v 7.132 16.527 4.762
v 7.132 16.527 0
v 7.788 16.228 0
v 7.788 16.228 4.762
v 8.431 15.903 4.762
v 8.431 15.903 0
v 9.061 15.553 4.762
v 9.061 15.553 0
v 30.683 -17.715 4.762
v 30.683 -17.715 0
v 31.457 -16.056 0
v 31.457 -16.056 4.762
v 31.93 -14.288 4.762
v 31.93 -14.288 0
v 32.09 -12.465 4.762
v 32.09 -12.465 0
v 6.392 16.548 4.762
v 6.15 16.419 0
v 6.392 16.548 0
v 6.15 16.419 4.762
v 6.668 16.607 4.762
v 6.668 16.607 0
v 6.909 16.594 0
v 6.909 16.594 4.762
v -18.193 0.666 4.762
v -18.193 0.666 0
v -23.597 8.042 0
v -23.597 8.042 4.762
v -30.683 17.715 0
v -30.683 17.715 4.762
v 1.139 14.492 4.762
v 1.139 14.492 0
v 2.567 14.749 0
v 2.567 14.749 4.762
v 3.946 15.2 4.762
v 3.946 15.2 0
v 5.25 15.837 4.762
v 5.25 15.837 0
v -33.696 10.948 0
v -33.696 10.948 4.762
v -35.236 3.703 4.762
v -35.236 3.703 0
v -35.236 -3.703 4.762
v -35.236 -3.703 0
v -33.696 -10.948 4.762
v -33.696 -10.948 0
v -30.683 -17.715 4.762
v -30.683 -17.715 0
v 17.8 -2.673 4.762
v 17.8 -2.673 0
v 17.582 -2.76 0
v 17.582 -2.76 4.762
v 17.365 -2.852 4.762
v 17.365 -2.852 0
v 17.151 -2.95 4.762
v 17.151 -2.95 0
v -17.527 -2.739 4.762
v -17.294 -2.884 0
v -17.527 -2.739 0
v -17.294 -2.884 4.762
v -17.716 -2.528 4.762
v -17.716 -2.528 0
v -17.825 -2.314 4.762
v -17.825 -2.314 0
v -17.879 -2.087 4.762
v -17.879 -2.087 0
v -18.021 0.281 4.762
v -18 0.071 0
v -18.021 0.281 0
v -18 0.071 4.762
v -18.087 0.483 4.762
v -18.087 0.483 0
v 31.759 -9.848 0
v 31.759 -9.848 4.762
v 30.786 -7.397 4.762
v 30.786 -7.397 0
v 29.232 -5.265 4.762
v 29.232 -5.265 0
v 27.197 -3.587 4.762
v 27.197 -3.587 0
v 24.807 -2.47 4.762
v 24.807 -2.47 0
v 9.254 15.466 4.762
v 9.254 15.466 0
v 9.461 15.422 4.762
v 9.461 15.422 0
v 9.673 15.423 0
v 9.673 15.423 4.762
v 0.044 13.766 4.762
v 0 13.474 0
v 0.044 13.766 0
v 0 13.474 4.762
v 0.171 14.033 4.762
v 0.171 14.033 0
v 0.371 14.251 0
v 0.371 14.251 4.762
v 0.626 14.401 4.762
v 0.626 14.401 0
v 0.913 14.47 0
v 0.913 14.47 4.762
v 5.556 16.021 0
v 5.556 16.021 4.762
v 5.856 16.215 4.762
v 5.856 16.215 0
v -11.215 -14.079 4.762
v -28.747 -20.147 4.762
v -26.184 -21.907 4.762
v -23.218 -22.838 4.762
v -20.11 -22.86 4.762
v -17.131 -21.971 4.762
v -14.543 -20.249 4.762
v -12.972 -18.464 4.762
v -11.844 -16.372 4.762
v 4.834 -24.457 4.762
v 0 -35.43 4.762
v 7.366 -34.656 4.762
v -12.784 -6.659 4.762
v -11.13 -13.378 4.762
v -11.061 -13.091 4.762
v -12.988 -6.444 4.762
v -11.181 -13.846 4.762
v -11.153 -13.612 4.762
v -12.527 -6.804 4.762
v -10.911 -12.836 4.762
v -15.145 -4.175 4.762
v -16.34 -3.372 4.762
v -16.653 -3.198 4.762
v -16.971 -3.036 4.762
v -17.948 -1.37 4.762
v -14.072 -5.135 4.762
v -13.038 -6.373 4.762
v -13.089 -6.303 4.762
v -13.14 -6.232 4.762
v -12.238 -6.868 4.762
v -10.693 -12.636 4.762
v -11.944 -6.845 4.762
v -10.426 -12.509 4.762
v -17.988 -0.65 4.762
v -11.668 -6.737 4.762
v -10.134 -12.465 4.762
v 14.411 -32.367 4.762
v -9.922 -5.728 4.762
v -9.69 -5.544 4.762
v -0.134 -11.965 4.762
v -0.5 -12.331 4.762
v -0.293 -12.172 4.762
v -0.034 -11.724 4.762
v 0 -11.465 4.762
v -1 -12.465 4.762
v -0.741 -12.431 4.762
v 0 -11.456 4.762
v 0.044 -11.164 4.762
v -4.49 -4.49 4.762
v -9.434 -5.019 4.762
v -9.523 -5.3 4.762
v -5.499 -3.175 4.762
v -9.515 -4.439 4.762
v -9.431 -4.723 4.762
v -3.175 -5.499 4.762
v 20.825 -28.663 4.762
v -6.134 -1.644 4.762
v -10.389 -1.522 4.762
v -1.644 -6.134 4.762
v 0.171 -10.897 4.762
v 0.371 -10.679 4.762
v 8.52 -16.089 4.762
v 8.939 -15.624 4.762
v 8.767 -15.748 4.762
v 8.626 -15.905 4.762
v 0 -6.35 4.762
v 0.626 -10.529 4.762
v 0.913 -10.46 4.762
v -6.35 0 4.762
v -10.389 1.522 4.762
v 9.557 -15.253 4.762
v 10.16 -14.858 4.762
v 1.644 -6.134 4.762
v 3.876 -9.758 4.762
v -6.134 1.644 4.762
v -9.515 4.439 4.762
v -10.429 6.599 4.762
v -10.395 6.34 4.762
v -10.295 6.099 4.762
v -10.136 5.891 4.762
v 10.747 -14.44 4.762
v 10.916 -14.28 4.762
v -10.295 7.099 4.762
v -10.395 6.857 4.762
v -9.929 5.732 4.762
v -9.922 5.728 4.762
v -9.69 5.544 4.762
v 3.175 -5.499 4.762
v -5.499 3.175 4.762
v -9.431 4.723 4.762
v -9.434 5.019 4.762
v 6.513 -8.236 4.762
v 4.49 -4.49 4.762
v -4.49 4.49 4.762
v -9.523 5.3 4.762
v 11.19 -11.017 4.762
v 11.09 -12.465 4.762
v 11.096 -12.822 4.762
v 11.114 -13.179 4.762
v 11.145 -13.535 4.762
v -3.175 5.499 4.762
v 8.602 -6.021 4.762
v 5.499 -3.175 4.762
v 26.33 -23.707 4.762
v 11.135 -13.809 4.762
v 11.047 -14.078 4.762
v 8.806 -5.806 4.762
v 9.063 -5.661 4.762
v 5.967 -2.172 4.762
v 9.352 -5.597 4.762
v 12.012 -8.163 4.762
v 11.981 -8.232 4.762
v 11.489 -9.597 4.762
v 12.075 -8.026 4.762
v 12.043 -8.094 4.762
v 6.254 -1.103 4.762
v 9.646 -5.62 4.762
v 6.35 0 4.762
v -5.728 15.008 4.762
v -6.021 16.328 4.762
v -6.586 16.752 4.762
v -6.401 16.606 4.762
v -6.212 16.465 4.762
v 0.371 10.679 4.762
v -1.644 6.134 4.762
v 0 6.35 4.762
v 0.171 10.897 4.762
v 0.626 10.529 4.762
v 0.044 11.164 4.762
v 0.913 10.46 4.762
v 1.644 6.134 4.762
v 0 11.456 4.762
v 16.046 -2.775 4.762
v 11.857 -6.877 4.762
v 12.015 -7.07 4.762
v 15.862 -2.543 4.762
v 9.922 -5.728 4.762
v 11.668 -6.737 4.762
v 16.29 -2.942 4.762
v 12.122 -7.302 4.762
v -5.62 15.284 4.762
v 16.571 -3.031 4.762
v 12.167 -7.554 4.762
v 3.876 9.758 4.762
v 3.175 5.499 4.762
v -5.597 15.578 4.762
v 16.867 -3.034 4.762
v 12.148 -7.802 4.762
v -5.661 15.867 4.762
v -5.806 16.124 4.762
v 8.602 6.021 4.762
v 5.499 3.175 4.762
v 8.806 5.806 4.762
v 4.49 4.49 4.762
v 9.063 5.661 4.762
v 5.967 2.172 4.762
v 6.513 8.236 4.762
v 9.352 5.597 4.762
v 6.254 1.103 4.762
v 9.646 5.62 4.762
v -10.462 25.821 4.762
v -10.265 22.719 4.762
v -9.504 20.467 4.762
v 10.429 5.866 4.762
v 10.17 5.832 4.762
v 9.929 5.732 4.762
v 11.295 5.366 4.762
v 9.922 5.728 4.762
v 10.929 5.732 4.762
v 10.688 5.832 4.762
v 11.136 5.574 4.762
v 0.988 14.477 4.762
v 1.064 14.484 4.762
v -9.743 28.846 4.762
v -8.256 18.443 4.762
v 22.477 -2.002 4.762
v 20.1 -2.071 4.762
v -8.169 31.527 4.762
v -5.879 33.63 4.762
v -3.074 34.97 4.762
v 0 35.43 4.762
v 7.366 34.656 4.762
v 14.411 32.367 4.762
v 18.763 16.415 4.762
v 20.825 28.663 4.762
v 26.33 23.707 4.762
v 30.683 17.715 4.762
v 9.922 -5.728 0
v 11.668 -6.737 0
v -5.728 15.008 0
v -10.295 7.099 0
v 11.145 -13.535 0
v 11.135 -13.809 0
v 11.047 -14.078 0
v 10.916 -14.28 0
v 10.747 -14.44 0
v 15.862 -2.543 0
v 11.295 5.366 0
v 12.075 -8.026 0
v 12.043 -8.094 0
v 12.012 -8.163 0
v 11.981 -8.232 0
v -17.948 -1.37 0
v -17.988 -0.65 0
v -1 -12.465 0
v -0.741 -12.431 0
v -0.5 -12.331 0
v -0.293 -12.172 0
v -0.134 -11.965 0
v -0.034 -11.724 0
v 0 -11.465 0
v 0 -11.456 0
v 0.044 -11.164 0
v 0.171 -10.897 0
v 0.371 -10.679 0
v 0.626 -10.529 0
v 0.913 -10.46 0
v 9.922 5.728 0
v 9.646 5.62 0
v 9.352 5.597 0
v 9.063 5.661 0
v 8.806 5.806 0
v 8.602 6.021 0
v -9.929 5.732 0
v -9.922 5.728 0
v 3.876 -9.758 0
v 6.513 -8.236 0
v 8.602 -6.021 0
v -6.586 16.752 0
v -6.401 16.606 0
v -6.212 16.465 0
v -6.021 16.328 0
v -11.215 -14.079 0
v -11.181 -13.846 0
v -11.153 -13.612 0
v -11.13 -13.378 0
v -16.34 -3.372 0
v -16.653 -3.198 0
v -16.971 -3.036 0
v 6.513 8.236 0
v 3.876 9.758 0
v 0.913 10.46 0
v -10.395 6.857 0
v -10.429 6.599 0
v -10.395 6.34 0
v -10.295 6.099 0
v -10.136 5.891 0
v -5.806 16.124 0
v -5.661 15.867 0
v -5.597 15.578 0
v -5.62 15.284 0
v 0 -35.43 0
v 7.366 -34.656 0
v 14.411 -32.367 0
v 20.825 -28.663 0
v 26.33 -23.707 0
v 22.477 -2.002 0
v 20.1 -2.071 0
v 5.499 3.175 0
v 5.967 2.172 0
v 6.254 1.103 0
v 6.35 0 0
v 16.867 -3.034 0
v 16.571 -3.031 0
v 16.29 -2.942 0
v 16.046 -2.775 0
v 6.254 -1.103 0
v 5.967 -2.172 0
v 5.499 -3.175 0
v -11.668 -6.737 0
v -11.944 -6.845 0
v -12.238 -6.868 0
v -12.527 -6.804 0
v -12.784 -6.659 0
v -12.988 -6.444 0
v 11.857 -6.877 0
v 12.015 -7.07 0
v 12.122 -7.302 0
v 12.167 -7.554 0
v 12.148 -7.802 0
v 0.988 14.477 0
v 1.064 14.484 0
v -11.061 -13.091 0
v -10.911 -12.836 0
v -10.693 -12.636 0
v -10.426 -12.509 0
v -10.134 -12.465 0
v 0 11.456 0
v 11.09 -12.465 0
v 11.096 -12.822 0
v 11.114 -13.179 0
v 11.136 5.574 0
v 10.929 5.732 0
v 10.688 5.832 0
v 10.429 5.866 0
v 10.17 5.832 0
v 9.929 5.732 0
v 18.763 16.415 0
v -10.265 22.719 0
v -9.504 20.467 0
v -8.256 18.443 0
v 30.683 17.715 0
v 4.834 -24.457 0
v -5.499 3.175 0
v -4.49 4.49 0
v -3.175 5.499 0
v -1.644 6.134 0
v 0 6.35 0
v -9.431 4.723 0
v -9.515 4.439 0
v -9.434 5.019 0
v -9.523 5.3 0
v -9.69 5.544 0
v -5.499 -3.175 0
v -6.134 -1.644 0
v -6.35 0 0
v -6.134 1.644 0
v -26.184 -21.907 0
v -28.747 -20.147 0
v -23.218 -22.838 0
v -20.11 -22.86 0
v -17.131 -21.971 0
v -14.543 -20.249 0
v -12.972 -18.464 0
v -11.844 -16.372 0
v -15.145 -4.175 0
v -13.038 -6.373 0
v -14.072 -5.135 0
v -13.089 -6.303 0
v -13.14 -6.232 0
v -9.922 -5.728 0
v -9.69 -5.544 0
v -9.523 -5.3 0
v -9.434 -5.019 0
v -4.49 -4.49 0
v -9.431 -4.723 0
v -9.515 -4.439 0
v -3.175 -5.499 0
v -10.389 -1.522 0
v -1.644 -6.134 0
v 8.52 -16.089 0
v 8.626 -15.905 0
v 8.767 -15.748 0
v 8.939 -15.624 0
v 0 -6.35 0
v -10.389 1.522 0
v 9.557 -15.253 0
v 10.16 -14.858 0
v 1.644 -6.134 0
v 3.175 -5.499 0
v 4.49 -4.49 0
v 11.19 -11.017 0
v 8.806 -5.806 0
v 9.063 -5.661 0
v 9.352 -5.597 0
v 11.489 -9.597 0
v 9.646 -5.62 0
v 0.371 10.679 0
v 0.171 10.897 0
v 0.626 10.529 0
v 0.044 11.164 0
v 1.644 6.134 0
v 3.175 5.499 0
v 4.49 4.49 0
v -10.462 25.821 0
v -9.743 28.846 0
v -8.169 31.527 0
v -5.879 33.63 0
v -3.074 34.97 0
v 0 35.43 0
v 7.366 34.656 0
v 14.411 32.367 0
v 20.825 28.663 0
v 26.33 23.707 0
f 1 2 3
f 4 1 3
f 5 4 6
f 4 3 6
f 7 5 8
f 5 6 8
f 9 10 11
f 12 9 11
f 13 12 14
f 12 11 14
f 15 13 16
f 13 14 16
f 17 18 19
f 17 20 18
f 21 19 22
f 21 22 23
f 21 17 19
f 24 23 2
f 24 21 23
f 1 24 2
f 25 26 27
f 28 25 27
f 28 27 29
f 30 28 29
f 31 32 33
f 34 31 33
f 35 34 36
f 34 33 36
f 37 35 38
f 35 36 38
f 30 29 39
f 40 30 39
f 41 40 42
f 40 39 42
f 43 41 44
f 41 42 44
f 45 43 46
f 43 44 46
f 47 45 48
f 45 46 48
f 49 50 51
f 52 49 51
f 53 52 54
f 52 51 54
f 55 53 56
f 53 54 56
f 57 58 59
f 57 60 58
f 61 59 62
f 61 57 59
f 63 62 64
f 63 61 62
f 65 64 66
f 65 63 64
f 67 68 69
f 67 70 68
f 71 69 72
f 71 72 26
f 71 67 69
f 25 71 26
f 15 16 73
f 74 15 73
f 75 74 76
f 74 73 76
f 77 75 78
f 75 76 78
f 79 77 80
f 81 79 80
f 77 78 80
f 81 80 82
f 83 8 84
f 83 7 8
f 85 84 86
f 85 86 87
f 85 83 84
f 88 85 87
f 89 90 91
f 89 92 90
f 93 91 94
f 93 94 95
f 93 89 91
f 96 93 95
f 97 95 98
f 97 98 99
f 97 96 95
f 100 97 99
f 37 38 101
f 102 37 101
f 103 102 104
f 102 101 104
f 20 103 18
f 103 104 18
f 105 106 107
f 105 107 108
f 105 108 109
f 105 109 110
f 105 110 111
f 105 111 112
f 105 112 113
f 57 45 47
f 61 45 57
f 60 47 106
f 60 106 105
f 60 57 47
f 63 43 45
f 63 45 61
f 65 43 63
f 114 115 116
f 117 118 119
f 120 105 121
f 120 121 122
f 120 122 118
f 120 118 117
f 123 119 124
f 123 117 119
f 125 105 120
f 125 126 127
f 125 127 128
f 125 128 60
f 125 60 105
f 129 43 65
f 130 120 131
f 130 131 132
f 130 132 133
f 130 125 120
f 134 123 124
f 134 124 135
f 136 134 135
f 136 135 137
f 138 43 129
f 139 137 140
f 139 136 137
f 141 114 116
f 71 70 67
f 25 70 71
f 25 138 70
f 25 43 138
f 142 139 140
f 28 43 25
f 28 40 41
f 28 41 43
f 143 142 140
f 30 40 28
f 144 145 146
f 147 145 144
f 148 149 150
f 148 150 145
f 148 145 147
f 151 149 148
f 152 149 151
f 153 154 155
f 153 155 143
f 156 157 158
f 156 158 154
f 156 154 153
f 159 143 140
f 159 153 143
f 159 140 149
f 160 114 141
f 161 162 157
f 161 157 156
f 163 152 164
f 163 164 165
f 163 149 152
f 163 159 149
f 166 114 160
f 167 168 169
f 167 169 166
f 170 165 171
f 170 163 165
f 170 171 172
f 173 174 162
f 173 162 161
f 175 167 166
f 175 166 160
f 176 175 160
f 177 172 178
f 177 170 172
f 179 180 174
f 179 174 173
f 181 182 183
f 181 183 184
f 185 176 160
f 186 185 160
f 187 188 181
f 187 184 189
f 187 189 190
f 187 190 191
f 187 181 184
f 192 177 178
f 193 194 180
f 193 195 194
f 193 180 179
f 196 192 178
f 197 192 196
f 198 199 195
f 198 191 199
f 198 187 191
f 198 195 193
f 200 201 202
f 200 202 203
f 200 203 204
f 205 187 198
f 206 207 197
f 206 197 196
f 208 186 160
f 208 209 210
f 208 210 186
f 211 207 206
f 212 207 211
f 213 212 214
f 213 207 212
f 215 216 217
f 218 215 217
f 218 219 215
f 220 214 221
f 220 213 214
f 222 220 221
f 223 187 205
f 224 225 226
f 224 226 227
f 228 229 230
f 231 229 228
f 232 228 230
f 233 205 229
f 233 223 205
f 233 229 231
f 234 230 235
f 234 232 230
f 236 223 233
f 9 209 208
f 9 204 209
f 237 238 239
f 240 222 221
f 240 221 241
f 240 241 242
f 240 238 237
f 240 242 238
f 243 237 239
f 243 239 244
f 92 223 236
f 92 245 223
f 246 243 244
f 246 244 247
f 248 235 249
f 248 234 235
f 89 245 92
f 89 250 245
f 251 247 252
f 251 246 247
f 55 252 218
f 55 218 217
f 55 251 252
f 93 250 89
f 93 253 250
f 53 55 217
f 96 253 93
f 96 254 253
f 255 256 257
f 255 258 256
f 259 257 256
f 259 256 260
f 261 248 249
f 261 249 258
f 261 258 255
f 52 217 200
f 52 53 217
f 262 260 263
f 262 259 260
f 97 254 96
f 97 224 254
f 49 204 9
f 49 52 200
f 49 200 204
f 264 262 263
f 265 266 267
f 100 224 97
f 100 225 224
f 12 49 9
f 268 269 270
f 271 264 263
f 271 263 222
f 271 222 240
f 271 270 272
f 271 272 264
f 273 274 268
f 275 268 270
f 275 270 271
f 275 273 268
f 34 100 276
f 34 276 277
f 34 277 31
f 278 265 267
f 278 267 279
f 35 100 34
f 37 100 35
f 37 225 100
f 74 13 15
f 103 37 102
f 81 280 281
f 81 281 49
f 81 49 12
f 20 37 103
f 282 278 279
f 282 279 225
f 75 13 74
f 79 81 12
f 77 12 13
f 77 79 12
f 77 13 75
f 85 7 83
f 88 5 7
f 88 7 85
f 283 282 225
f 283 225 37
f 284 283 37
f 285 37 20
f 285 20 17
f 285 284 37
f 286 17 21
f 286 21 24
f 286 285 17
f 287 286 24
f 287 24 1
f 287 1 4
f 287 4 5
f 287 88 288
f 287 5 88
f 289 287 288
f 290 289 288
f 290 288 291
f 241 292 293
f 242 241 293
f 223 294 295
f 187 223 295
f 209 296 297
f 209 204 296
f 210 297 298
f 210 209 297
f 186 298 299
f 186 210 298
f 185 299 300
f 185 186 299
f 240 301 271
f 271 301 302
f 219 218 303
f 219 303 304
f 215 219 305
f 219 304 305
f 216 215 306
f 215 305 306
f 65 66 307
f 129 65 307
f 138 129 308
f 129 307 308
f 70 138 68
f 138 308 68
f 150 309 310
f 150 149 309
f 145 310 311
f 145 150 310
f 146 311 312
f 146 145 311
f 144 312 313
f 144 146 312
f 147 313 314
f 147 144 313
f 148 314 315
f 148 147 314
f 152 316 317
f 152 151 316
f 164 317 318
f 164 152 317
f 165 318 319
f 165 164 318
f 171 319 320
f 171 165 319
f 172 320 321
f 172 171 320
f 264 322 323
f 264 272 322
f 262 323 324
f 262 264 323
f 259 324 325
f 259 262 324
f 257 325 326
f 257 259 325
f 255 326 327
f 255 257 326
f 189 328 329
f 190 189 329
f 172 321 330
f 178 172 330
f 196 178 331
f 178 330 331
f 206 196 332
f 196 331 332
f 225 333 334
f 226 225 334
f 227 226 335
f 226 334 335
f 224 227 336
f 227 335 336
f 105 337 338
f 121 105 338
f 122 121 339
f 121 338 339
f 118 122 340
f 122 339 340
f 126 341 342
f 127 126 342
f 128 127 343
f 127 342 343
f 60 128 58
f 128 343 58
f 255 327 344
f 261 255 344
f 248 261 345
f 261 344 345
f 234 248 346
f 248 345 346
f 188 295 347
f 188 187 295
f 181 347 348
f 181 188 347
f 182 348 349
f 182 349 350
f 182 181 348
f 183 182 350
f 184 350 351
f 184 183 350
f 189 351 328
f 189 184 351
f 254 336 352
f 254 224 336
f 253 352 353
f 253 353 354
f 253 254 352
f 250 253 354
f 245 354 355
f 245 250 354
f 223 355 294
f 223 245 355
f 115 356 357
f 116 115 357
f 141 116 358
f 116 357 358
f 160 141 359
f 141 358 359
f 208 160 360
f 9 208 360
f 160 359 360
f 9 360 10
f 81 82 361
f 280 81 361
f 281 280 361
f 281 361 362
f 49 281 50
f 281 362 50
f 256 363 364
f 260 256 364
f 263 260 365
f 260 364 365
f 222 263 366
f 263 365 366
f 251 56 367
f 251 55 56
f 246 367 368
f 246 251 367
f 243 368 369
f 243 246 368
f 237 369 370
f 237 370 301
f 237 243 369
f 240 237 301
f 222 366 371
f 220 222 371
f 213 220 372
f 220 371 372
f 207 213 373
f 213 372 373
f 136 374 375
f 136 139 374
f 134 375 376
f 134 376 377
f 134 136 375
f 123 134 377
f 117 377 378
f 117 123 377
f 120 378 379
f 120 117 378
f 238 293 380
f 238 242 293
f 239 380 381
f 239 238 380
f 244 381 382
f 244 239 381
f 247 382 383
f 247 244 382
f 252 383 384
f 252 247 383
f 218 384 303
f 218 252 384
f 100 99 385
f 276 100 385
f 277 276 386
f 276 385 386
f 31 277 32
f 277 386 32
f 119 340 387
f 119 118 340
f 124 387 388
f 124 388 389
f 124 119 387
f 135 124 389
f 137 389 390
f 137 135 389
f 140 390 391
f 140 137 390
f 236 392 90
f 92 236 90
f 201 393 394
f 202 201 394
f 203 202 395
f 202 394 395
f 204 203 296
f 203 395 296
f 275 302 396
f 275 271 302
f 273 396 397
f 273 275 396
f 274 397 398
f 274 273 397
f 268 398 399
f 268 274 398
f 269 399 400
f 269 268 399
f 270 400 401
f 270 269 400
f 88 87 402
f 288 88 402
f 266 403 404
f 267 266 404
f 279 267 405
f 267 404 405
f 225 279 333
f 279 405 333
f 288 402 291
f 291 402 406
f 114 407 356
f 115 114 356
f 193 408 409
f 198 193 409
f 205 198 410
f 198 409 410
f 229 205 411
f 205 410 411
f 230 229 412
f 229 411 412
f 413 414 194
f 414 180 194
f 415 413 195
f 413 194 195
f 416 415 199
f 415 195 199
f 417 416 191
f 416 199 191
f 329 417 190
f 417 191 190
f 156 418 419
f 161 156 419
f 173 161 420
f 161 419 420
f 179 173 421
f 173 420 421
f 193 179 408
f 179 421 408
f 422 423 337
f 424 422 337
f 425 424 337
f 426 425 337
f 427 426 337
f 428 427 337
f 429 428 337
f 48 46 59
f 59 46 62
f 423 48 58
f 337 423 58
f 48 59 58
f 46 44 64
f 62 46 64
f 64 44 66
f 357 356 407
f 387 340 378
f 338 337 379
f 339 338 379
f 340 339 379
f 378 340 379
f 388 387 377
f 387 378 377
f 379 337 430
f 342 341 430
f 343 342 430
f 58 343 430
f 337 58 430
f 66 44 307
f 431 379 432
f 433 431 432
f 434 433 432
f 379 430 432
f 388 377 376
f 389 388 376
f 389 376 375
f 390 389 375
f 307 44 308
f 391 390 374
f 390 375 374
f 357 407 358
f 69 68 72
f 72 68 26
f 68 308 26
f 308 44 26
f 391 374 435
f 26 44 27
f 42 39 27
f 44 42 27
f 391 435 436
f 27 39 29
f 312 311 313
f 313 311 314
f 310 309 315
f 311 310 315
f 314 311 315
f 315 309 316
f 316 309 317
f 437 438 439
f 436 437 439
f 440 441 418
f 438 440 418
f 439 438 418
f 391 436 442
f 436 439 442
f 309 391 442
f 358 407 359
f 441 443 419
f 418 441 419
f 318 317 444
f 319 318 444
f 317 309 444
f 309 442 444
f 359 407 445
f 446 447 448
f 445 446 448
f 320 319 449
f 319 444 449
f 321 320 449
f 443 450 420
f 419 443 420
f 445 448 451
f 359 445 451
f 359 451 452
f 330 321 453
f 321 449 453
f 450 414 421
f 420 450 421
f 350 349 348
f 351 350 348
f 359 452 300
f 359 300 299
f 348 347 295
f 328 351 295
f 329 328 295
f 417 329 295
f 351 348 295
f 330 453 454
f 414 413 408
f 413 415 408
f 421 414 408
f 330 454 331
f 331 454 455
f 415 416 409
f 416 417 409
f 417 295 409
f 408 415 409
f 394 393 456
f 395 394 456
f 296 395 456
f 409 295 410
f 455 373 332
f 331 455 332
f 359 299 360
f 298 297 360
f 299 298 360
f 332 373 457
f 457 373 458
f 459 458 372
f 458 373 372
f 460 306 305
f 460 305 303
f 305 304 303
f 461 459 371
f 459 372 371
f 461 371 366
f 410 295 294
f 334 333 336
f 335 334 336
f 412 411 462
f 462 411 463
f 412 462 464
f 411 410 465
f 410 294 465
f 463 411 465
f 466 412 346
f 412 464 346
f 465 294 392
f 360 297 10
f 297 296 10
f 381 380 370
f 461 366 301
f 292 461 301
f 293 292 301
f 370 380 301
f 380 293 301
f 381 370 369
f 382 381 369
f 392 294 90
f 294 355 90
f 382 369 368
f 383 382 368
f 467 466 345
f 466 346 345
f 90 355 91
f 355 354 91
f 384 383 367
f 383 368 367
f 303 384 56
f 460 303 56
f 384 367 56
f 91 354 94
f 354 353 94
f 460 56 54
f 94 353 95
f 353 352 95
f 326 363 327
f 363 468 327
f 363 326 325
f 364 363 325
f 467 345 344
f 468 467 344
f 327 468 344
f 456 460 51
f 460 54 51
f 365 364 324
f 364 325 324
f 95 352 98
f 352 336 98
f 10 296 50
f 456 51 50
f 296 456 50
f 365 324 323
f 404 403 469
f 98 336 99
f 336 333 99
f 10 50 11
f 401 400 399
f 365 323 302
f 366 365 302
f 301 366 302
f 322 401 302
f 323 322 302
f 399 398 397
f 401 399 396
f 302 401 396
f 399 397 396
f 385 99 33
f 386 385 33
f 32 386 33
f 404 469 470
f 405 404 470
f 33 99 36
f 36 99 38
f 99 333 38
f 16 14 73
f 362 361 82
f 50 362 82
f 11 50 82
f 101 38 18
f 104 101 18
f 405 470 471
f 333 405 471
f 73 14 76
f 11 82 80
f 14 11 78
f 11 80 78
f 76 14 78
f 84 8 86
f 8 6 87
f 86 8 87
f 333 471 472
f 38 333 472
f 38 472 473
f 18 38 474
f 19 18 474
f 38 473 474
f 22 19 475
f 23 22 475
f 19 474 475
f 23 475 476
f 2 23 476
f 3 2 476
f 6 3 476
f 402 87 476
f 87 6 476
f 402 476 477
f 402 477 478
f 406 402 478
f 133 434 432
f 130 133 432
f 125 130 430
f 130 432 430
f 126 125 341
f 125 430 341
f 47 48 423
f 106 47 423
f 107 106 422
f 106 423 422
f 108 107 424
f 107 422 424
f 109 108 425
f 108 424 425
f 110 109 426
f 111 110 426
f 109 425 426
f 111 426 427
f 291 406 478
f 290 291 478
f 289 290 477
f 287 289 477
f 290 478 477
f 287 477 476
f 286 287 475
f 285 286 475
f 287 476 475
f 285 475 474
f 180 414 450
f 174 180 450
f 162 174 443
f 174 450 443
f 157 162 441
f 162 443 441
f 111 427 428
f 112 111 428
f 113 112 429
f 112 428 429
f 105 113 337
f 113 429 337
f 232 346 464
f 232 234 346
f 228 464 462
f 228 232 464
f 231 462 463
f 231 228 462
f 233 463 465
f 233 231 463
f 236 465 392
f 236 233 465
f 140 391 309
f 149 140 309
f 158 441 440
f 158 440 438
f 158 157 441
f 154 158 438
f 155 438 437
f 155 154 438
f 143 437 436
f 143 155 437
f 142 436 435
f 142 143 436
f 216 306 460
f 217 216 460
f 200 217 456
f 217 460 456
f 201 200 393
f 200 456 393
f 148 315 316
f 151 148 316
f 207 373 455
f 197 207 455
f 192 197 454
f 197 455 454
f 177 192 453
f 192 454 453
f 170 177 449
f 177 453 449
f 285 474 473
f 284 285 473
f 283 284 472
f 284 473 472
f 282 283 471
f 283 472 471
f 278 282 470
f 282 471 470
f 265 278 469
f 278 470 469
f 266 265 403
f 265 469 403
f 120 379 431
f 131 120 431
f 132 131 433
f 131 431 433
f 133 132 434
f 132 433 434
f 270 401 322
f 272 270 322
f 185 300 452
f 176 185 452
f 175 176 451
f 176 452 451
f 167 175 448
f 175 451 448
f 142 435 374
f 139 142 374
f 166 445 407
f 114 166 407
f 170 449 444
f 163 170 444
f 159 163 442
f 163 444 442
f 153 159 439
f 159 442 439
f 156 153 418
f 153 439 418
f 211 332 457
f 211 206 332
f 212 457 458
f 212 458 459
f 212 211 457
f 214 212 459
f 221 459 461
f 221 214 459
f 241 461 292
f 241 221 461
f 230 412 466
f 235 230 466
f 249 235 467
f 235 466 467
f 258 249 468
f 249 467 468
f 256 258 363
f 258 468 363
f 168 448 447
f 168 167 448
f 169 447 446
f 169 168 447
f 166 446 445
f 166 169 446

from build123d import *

# Parameters (mm, degrees)
F1_DEPTH = 4.7625
F2_R     = 1


with BuildPart() as f1:
    # F0 (on Top) → F1 (new body)
    with BuildSketch(Plane.XY):
        with BuildLine():
            ThreePointArc((-5.499261314, -3.175), (-6.35, 0), (-5.499261314, 3.175))
            Line((-5.499261314, 3.175), (-9.0932667397, 5.25))
            ThreePointArc((-9.0932667397, 5.25), (-10.5, 0), (-9.0932667397, -5.25))
            Line((-9.0932667397, -5.25), (-5.499261314, -3.175))
        make_face()
        with BuildLine():
            Line((0, -10.5), (0, -6.35))
            ThreePointArc((0, -6.35), (-3.175, -5.499261314), (-5.499261314, -3.175))
            Line((-5.499261314, -3.175), (-9.0932667397, -5.25))
            ThreePointArc((-9.0932667397, -5.25), (-5.25, -9.0932667397), (0, -10.5))
        make_face()
        with BuildLine():
            Line((9.0932667397, -5.25), (5.499261314, -3.175))
            ThreePointArc((5.499261314, -3.175), (3.175, -5.499261314), (0, -6.35))
            Line((0, -6.35), (0, -10.5))
            ThreePointArc((0, -10.5), (5.25, -9.0932667397), (9.0932667397, -5.25))
        make_face()
        with BuildLine():
            ThreePointArc((5.499261314, 3.175), (6.1336289969, 1.6435009364), (6.35, 0))
            ThreePointArc((6.35, 0), (6.1336289969, -1.6435009364), (5.499261314, -3.175))
            Line((5.499261314, -3.175), (9.0932667397, -5.25))
            ThreePointArc((9.0932667397, -5.25), (10.142221176, -2.7175999736), (10.5, 0))
            ThreePointArc((10.5, 0), (10.142221176, 2.7175999736), (9.0932667397, 5.25))
            Line((9.0932667397, 5.25), (5.499261314, 3.175))
        make_face()
        with BuildLine():
            ThreePointArc((0, 6.35), (3.175, 5.499261314), (5.499261314, 3.175))
            Line((5.499261314, 3.175), (9.0932667397, 5.25))
            ThreePointArc((9.0932667397, 5.25), (5.25, 9.0932667397), (0, 10.5))
            Line((0, 10.5), (0, 6.35))
        make_face()
        with BuildLine():
            ThreePointArc((-5.499261314, 3.175), (-3.175, 5.499261314), (0, 6.35))
            Line((0, 6.35), (0, 10.5))
            ThreePointArc((0, 10.5), (-5.25, 9.0932667397), (-9.0932667397, 5.25))
            Line((-9.0932667397, 5.25), (-5.499261314, 3.175))
        make_face()
        with BuildLine():
            Line((-30.6832667397, -17.7149923118), (-21.59, -12.4649923118))
            ThreePointArc((-21.59, -12.4649923118), (-23.7308339091, -7.638825519), (-24.8073171849, -2.4700500843))
            ThreePointArc((-24.8073171849, -2.4700500843), (-31.387432573, -8.6887090891), (-30.6832667397, -17.7149923118))
        make_face()
        with BuildLine():
            ThreePointArc((-14.5427847141, -20.2487418398), (-18.4808339091, -16.7320922588), (-21.59, -12.4649923118))
            Line((-21.59, -12.4649923118), (-30.6832667397, -17.7149923118))
            ThreePointArc((-30.6832667397, -17.7149923118), (-23.2183590837, -22.8379594232), (-14.5427847141, -20.2487418398))
        make_face()
        with BuildLine():
            ThreePointArc((-24.8073171849, -2.4700500843), (-24.7664239313, 2.8510312146), (-23.5971783755, 8.0422202188))
            Line((-23.5971783755, 8.0422202188), (-30.6832667397, 17.7149923118))
            ThreePointArc((-30.6832667397, 17.7149923118), (-35.4299846236, 0), (-30.6832667397, -17.7149923118))
            ThreePointArc((-30.6832667397, -17.7149923118), (-31.387432573, -8.6887090891), (-24.8073171849, -2.4700500843))
        make_face()
        with BuildLine():
            ThreePointArc((-17.8004721403, -2.6726749865), (-17.9637015789, -1.1425522236), (-17.9956452163, 0.3959207605))
            Line((-17.9956452163, 0.3959207605), (-23.5971783755, 8.0422202188))
            ThreePointArc((-23.5971783755, 8.0422202188), (-24.7664239313, 2.8510312146), (-24.8073171849, -2.4700500843))
            ThreePointArc((-24.8073171849, -2.4700500843), (-21.286486447, -1.9693799179), (-17.8004721403, -2.6726749865))
        make_face()
        with BuildLine():
            Line((-21.59, -12.4649923118), (-17.2877645627, -5.0133019483))
            ThreePointArc((-17.2877645627, -5.0133019483), (-17.5831090076, -3.851529258), (-17.8004721403, -2.6726749865))
            ThreePointArc((-17.8004721403, -2.6726749865), (-21.286486447, -1.9693799179), (-24.8073171849, -2.4700500843))
            ThreePointArc((-24.8073171849, -2.4700500843), (-23.7308339091, -7.638825519), (-21.59, -12.4649923118))
        make_face()
        with BuildLine():
            ThreePointArc((-11.2148405045, -14.0793235796), (-12.1270766847, -13.3016544491), (-12.9855291254, -12.4649923118))
            Line((-12.9855291254, -12.4649923118), (-21.59, -12.4649923118))
            ThreePointArc((-21.59, -12.4649923118), (-18.4808339091, -16.7320922588), (-14.5427847141, -20.2487418398))
            ThreePointArc((-14.5427847141, -20.2487418398), (-12.3487762621, -17.4499480615), (-11.2148405045, -14.0793235796))
        make_face()
        with BuildLine():
            ThreePointArc((-12.9855291254, -12.4649923118), (-14.3916544405, -10.8111184651), (-15.5884572681, -9))
            Line((-15.5884572681, -9), (-21.59, -12.4649923118))
            Line((-21.59, -12.4649923118), (-12.9855291254, -12.4649923118))
        make_face()
        with BuildLine():
            Line((-21.59, -12.4649923118), (-15.5884572681, -9))
            ThreePointArc((-15.5884572681, -9), (-16.5585304543, -7.0579791154), (-17.2877645627, -5.0133019483))
            Line((-17.2877645627, -5.0133019483), (-21.59, -12.4649923118))
        make_face()
        with BuildLine():
            Line((-15.5884572681, -9), (-12.4967332603, -7.2149923118))
            ThreePointArc((-12.4967332603, -7.2149923118), (-12.8045182874, -6.7147478755), (-13.139793395, -6.2324961559))
            ThreePointArc((-13.139793395, -6.2324961559), (-14.5921490915, -4.6368327157), (-16.34, -3.3717255721))
            Line((-16.34, -3.3717255721), (-17.2877645627, -5.0133019483))
            ThreePointArc((-17.2877645627, -5.0133019483), (-16.5585304543, -7.0579791154), (-15.5884572681, -9))
        make_face()
        with BuildLine():
            ThreePointArc((-11.09, -12.4649923118), (-11.447778824, -9.7473923382), (-12.4967332603, -7.2149923118))
            Line((-12.4967332603, -7.2149923118), (-15.5884572681, -9))
            ThreePointArc((-15.5884572681, -9), (-14.3916544405, -10.8111184651), (-12.9855291254, -12.4649923118))
            Line((-12.9855291254, -12.4649923118), (-11.09, -12.4649923118))
        make_face()
        with BuildLine():
            Line((-17.2877645627, -5.0133019483), (-16.34, -3.3717255721))
            ThreePointArc((-16.34, -3.3717255721), (-17.0567413584, -2.9940068252), (-17.8004721403, -2.6726749865))
            ThreePointArc((-17.8004721403, -2.6726749865), (-17.5831090076, -3.851529258), (-17.2877645627, -5.0133019483))
        make_face()
        with BuildLine():
            ThreePointArc((-11.2148405045, -14.0793235796), (-11.1212566489, -13.2745679095), (-11.09, -12.4649923118))
            Line((-11.09, -12.4649923118), (-12.9855291254, -12.4649923118))
            ThreePointArc((-12.9855291254, -12.4649923118), (-12.1270766847, -13.3016544491), (-11.2148405045, -14.0793235796))
        make_face()
        with BuildLine():
            Line((21.59, -12.4649923118), (17.2877645627, -5.0133019483))
            ThreePointArc((17.2877645627, -5.0133019483), (16.5585304543, -7.0579791154), (15.5884572681, -9))
            Line((15.5884572681, -9), (21.59, -12.4649923118))
        make_face()
        with BuildLine():
            Line((17.2877645627, -5.0133019483), (16.34, -3.3717255721))
            ThreePointArc((16.34, -3.3717255721), (14.1653787975, -5.0403711093), (12.4967332603, -7.2149923118))
            Line((12.4967332603, -7.2149923118), (15.5884572681, -9))
            ThreePointArc((15.5884572681, -9), (16.5585304543, -7.0579791154), (17.2877645627, -5.0133019483))
        make_face()
        with BuildLine():
            Line((15.5884572681, -9), (12.4967332603, -7.2149923118))
            ThreePointArc((12.4967332603, -7.2149923118), (12.2250524559, -7.7165444079), (11.9810090739, -8.2321099153))
            ThreePointArc((11.9810090739, -8.2321099153), (11.3151665531, -10.3021706275), (11.09, -12.4649923118))
            Line((11.09, -12.4649923118), (12.9855291254, -12.4649923118))
            ThreePointArc((12.9855291254, -12.4649923118), (14.3916544405, -10.8111184651), (15.5884572681, -9))
        make_face()
        with BuildLine():
            Line((21.59, -12.4649923118), (15.5884572681, -9))
            ThreePointArc((15.5884572681, -9), (14.3916544405, -10.8111184651), (12.9855291254, -12.4649923118))
            Line((12.9855291254, -12.4649923118), (21.59, -12.4649923118))
        make_face()
        with BuildLine():
            ThreePointArc((14.5427847141, -20.2487418398), (18.4808339091, -16.7320922588), (21.59, -12.4649923118))
            Line((21.59, -12.4649923118), (12.9855291254, -12.4649923118))
            ThreePointArc((12.9855291254, -12.4649923118), (12.1270766847, -13.3016544491), (11.2148405045, -14.0793235796))
            ThreePointArc((11.2148405045, -14.0793235796), (12.3487762621, -17.4499480615), (14.5427847141, -20.2487418398))
        make_face()
        with BuildLine():
            ThreePointArc((24.8073171849, -2.4700500843), (23.7308339091, -7.638825519), (21.59, -12.4649923118))
            Line((21.59, -12.4649923118), (30.6832667397, -17.7149923118))
            ThreePointArc((30.6832667397, -17.7149923118), (31.732221176, -15.1825922854), (32.09, -12.4649923118))
            ThreePointArc((32.09, -12.4649923118), (30.0762191358, -6.2816206766), (24.8073171849, -2.4700500843))
        make_face()
        with BuildLine():
            ThreePointArc((17.8004721403, -2.6726749865), (17.5831090076, -3.851529258), (17.2877645627, -5.0133019483))
            Line((17.2877645627, -5.0133019483), (21.59, -12.4649923118))
            ThreePointArc((21.59, -12.4649923118), (23.7308339091, -7.638825519), (24.8073171849, -2.4700500843))
            ThreePointArc((24.8073171849, -2.4700500843), (21.286486447, -1.9693799179), (17.8004721403, -2.6726749865))
        make_face()
        with BuildLine():
            ThreePointArc((17.8004721403, -2.6726749865), (17.0567413584, -2.9940068252), (16.34, -3.3717255721))
            Line((16.34, -3.3717255721), (17.2877645627, -5.0133019483))
            ThreePointArc((17.2877645627, -5.0133019483), (17.5831090076, -3.851529258), (17.8004721403, -2.6726749865))
        make_face()
        with BuildLine():
            ThreePointArc((30.6832667397, -17.7149923118), (23.2183590837, -22.8379594232), (14.5427847141, -20.2487418398))
            ThreePointArc((14.5427847141, -20.2487418398), (9.9141341412, -22.8738732523), (4.8337957326, -24.4568712666))
            Line((4.8337957326, -24.4568712666), (0, -35.4299846236))
            ThreePointArc((0, -35.4299846236), (17.7149923118, -30.6832667397), (30.6832667397, -17.7149923118))
        make_face()
        with BuildLine():
            ThreePointArc((11.2148405045, -14.0793235796), (9.9713029836, -14.9857638047), (8.6548881807, -15.7826775479))
            Line((8.6548881807, -15.7826775479), (4.8337957326, -24.4568712666))
            ThreePointArc((4.8337957326, -24.4568712666), (9.9141341412, -22.8738732523), (14.5427847141, -20.2487418398))
            ThreePointArc((14.5427847141, -20.2487418398), (12.3487762621, -17.4499480615), (11.2148405045, -14.0793235796))
        make_face()
        with BuildLine():
            Line((12.9855291254, -12.4649923118), (11.09, -12.4649923118))
            ThreePointArc((11.09, -12.4649923118), (11.1212566489, -13.2745679095), (11.2148405045, -14.0793235796))
            ThreePointArc((11.2148405045, -14.0793235796), (12.1270766847, -13.3016544491), (12.9855291254, -12.4649923118))
        make_face()
        with BuildLine():
            Line((30.6832667397, -17.7149923118), (21.59, -12.4649923118))
            ThreePointArc((21.59, -12.4649923118), (18.4808339091, -16.7320922588), (14.5427847141, -20.2487418398))
            ThreePointArc((14.5427847141, -20.2487418398), (23.2183590837, -22.8379594232), (30.6832667397, -17.7149923118))
        make_face()
        with BuildLine():
            Line((0, 18), (0, 14.4299846236))
            ThreePointArc((0, 14.4299846236), (0.5701972901, 14.4454781951), (1.1387118387, 14.4919131854))
            ThreePointArc((1.1387118387, 14.4919131854), (3.2643582308, 14.9503070065), (5.25, 15.8367178839))
            Line((5.25, 15.8367178839), (4.3022354373, 17.4782942601))
            ThreePointArc((4.3022354373, 17.4782942601), (2.1668760138, 17.8690975805), (0, 18))
        make_face()
        with BuildLine():
            ThreePointArc((-4.3022354373, 17.4782942601), (-2.1668760138, 17.8690975805), (0, 18))
            Line((0, 18), (0, 24.9299846236))
            Line((0, 24.9299846236), (-4.3022354373, 17.4782942601))
        make_face()
        with BuildLine():
            Line((0, 24.9299846236), (0, 18))
            ThreePointArc((0, 18), (2.1668760138, 17.8690975805), (4.3022354373, 17.4782942601))
            Line((4.3022354373, 17.4782942601), (0, 24.9299846236))
        make_face()
        with BuildLine():
            ThreePointArc((-6.5856316358, 16.7519985661), (-5.9354847095, 16.2685747347), (-5.25, 15.8367178839))
            Line((-5.25, 15.8367178839), (-4.3022354373, 17.4782942601))
            ThreePointArc((-4.3022354373, 17.4782942601), (-5.456032323, 17.1531837071), (-6.5856316358, 16.7519985661))
        make_face()
        with BuildLine():
            Line((0, 24.9299846236), (4.3022354373, 17.4782942601))
            ThreePointArc((4.3022354373, 17.4782942601), (5.456032323, 17.1531837071), (6.5856316358, 16.7519985661))
            ThreePointArc((6.5856316358, 16.7519985661), (8.9377101849, 19.4193279794), (10.2645324709, 22.718791924))
            ThreePointArc((10.2645324709, 22.718791924), (5.25, 24.3709177778), (0, 24.9299846236))
        make_face()
        with BuildLine():
            Line((4.3022354373, 17.4782942601), (5.25, 15.8367178839))
            ThreePointArc((5.25, 15.8367178839), (5.9354847095, 16.2685747347), (6.5856316358, 16.7519985661))
            ThreePointArc((6.5856316358, 16.7519985661), (5.456032323, 17.1531837071), (4.3022354373, 17.4782942601))
        make_face()
        with BuildLine():
            ThreePointArc((-5.25, 15.8367178839), (-2.7175999736, 14.7877634476), (0, 14.4299846236))
            Line((0, 14.4299846236), (0, 18))
            ThreePointArc((0, 18), (-2.1668760138, 17.8690975805), (-4.3022354373, 17.4782942601))
            Line((-4.3022354373, 17.4782942601), (-5.25, 15.8367178839))
        make_face()
        with BuildLine():
            ThreePointArc((-6.5856316358, 16.7519985661), (-5.456032323, 17.1531837071), (-4.3022354373, 17.4782942601))
            Line((-4.3022354373, 17.4782942601), (0, 24.9299846236))
            ThreePointArc((0, 24.9299846236), (-5.25, 24.3709177778), (-10.2645324709, 22.718791924))
            ThreePointArc((-10.2645324709, 22.718791924), (-8.9377101849, 19.4193279794), (-6.5856316358, 16.7519985661))
        make_face()
        with BuildLine():
            ThreePointArc((-10.2645324709, 22.718791924), (-5.25, 24.3709177778), (0, 24.9299846236))
            Line((0, 24.9299846236), (0, 35.4299846236))
            ThreePointArc((0, 35.4299846236), (-8.1690734892, 31.5266685123), (-10.2645324709, 22.718791924))
        make_face()
        with BuildLine():
            Line((0, 35.4299846236), (0, 24.9299846236))
            ThreePointArc((0, 24.9299846236), (5.25, 24.3709177778), (10.2645324709, 22.718791924))
            ThreePointArc((10.2645324709, 22.718791924), (10.4409671713, 23.8181372744), (10.5, 24.9299846236))
            ThreePointArc((10.5, 24.9299846236), (7.4246212025, 32.3546058261), (0, 35.4299846236))
        make_face()
        with BuildLine():
            ThreePointArc((10.2645324709, 22.718791924), (14.8522882489, 20.022828649), (18.7633739476, 16.4146255344))
            Line((18.7633739476, 16.4146255344), (30.6832667397, 17.7149923118))
            ThreePointArc((30.6832667397, 17.7149923118), (17.7149923118, 30.6832667397), (0, 35.4299846236))
            ThreePointArc((0, 35.4299846236), (7.4246212025, 32.3546058261), (10.5, 24.9299846236))
            ThreePointArc((10.5, 24.9299846236), (10.4409671713, 23.8181372744), (10.2645324709, 22.718791924))
        make_face()
        with BuildLine():
            ThreePointArc((6.5856316358, 16.7519985661), (7.9924006582, 16.128283595), (9.3407556058, 15.3866918053))
            Line((9.3407556058, 15.3866918053), (18.7633739476, 16.4146255344))
            ThreePointArc((18.7633739476, 16.4146255344), (14.8522882489, 20.022828649), (10.2645324709, 22.718791924))
            ThreePointArc((10.2645324709, 22.718791924), (8.9377101849, 19.4193279794), (6.5856316358, 16.7519985661))
        make_face()
        with BuildLine():
            ThreePointArc((-9.0932667397, 5.25), (-5.25, 9.0932667397), (0, 10.5))
            Line((0, 10.5), (0, 14.3676886584))
            Line((0, 14.3676886584), (0, 14.4299846236))
            ThreePointArc((0, 14.4299846236), (-2.7175999736, 14.7877634476), (-5.25, 15.8367178839))
            Line((-5.25, 15.8367178839), (-10.795, 6.2324961559))
            Line((-10.795, 6.2324961559), (-9.0932667397, 5.25))
        make_face()
        with BuildLine():
            Line((10.795, 6.2324961559), (9.0932667397, 5.25))
            ThreePointArc((9.0932667397, 5.25), (10.142221176, 2.7175999736), (10.5, 0))
            ThreePointArc((10.5, 0), (10.142221176, -2.7175999736), (9.0932667397, -5.25))
            Line((9.0932667397, -5.25), (12.4427833719, -7.1838443292))
            Line((12.4427833719, -7.1838443292), (12.4967332603, -7.2149923118))
            ThreePointArc((12.4967332603, -7.2149923118), (14.1653787975, -5.0403711093), (16.34, -3.3717255721))
            Line((16.34, -3.3717255721), (10.795, 6.2324961559))
        make_face()
        with BuildLine():
            Line((0, -12.4649923118), (0, -10.5))
            ThreePointArc((0, -10.5), (-5.25, -9.0932667397), (-9.0932667397, -5.25))
            Line((-9.0932667397, -5.25), (-12.4967332603, -7.2149923118))
            ThreePointArc((-12.4967332603, -7.2149923118), (-11.447778824, -9.7473923382), (-11.09, -12.4649923118))
            Line((-11.09, -12.4649923118), (0, -12.4649923118))
        make_face()
    extrude(amount=F1_DEPTH)

    # F2
    f2_edges = [f1.edges().sort_by_distance(p)[0] for p in [
        (0, -12.464992, 2.38125),
        (10.795, 6.232496, 2.38125),
        (-10.795, 6.232496, 2.38125),
        (8.654888, -15.782678, 2.38125),
        (11.214841, -14.079324, 2.38125),
        (-17.995645, 0.395921, 2.38125),
        (-17.800472, -2.672675, 2.38125),
        (9.340756, 15.386692, 2.38125),
        (6.585632, 16.751999, 2.38125),
        (0, 35.429985, 2.38125),
        (9.093267, -5.25, 2.38125),
        (0, -10.5, 2.38125),
        (0, 10.5, 2.38125),
        (-9.093267, -5.25, 2.38125),
        (30.683267, -17.714992, 2.38125),
        (-9.093267, 5.25, 2.38125),
        (-5.25, 15.836718, 2.38125),
        (-11.09, -12.464992, 2.38125),
        (9.093267, 5.25, 2.38125),
        (-30.683267, -17.714992, 2.38125),
        (16.34, -3.371726, 2.38125),
        (-12.496733, -7.214992, 2.38125),
        (12.496733, -7.214992, 2.38125),
        (0, 14.429985, 2.38125),
    ]]
    fillet(f2_edges, radius=F2_R)


solid = f1.part
